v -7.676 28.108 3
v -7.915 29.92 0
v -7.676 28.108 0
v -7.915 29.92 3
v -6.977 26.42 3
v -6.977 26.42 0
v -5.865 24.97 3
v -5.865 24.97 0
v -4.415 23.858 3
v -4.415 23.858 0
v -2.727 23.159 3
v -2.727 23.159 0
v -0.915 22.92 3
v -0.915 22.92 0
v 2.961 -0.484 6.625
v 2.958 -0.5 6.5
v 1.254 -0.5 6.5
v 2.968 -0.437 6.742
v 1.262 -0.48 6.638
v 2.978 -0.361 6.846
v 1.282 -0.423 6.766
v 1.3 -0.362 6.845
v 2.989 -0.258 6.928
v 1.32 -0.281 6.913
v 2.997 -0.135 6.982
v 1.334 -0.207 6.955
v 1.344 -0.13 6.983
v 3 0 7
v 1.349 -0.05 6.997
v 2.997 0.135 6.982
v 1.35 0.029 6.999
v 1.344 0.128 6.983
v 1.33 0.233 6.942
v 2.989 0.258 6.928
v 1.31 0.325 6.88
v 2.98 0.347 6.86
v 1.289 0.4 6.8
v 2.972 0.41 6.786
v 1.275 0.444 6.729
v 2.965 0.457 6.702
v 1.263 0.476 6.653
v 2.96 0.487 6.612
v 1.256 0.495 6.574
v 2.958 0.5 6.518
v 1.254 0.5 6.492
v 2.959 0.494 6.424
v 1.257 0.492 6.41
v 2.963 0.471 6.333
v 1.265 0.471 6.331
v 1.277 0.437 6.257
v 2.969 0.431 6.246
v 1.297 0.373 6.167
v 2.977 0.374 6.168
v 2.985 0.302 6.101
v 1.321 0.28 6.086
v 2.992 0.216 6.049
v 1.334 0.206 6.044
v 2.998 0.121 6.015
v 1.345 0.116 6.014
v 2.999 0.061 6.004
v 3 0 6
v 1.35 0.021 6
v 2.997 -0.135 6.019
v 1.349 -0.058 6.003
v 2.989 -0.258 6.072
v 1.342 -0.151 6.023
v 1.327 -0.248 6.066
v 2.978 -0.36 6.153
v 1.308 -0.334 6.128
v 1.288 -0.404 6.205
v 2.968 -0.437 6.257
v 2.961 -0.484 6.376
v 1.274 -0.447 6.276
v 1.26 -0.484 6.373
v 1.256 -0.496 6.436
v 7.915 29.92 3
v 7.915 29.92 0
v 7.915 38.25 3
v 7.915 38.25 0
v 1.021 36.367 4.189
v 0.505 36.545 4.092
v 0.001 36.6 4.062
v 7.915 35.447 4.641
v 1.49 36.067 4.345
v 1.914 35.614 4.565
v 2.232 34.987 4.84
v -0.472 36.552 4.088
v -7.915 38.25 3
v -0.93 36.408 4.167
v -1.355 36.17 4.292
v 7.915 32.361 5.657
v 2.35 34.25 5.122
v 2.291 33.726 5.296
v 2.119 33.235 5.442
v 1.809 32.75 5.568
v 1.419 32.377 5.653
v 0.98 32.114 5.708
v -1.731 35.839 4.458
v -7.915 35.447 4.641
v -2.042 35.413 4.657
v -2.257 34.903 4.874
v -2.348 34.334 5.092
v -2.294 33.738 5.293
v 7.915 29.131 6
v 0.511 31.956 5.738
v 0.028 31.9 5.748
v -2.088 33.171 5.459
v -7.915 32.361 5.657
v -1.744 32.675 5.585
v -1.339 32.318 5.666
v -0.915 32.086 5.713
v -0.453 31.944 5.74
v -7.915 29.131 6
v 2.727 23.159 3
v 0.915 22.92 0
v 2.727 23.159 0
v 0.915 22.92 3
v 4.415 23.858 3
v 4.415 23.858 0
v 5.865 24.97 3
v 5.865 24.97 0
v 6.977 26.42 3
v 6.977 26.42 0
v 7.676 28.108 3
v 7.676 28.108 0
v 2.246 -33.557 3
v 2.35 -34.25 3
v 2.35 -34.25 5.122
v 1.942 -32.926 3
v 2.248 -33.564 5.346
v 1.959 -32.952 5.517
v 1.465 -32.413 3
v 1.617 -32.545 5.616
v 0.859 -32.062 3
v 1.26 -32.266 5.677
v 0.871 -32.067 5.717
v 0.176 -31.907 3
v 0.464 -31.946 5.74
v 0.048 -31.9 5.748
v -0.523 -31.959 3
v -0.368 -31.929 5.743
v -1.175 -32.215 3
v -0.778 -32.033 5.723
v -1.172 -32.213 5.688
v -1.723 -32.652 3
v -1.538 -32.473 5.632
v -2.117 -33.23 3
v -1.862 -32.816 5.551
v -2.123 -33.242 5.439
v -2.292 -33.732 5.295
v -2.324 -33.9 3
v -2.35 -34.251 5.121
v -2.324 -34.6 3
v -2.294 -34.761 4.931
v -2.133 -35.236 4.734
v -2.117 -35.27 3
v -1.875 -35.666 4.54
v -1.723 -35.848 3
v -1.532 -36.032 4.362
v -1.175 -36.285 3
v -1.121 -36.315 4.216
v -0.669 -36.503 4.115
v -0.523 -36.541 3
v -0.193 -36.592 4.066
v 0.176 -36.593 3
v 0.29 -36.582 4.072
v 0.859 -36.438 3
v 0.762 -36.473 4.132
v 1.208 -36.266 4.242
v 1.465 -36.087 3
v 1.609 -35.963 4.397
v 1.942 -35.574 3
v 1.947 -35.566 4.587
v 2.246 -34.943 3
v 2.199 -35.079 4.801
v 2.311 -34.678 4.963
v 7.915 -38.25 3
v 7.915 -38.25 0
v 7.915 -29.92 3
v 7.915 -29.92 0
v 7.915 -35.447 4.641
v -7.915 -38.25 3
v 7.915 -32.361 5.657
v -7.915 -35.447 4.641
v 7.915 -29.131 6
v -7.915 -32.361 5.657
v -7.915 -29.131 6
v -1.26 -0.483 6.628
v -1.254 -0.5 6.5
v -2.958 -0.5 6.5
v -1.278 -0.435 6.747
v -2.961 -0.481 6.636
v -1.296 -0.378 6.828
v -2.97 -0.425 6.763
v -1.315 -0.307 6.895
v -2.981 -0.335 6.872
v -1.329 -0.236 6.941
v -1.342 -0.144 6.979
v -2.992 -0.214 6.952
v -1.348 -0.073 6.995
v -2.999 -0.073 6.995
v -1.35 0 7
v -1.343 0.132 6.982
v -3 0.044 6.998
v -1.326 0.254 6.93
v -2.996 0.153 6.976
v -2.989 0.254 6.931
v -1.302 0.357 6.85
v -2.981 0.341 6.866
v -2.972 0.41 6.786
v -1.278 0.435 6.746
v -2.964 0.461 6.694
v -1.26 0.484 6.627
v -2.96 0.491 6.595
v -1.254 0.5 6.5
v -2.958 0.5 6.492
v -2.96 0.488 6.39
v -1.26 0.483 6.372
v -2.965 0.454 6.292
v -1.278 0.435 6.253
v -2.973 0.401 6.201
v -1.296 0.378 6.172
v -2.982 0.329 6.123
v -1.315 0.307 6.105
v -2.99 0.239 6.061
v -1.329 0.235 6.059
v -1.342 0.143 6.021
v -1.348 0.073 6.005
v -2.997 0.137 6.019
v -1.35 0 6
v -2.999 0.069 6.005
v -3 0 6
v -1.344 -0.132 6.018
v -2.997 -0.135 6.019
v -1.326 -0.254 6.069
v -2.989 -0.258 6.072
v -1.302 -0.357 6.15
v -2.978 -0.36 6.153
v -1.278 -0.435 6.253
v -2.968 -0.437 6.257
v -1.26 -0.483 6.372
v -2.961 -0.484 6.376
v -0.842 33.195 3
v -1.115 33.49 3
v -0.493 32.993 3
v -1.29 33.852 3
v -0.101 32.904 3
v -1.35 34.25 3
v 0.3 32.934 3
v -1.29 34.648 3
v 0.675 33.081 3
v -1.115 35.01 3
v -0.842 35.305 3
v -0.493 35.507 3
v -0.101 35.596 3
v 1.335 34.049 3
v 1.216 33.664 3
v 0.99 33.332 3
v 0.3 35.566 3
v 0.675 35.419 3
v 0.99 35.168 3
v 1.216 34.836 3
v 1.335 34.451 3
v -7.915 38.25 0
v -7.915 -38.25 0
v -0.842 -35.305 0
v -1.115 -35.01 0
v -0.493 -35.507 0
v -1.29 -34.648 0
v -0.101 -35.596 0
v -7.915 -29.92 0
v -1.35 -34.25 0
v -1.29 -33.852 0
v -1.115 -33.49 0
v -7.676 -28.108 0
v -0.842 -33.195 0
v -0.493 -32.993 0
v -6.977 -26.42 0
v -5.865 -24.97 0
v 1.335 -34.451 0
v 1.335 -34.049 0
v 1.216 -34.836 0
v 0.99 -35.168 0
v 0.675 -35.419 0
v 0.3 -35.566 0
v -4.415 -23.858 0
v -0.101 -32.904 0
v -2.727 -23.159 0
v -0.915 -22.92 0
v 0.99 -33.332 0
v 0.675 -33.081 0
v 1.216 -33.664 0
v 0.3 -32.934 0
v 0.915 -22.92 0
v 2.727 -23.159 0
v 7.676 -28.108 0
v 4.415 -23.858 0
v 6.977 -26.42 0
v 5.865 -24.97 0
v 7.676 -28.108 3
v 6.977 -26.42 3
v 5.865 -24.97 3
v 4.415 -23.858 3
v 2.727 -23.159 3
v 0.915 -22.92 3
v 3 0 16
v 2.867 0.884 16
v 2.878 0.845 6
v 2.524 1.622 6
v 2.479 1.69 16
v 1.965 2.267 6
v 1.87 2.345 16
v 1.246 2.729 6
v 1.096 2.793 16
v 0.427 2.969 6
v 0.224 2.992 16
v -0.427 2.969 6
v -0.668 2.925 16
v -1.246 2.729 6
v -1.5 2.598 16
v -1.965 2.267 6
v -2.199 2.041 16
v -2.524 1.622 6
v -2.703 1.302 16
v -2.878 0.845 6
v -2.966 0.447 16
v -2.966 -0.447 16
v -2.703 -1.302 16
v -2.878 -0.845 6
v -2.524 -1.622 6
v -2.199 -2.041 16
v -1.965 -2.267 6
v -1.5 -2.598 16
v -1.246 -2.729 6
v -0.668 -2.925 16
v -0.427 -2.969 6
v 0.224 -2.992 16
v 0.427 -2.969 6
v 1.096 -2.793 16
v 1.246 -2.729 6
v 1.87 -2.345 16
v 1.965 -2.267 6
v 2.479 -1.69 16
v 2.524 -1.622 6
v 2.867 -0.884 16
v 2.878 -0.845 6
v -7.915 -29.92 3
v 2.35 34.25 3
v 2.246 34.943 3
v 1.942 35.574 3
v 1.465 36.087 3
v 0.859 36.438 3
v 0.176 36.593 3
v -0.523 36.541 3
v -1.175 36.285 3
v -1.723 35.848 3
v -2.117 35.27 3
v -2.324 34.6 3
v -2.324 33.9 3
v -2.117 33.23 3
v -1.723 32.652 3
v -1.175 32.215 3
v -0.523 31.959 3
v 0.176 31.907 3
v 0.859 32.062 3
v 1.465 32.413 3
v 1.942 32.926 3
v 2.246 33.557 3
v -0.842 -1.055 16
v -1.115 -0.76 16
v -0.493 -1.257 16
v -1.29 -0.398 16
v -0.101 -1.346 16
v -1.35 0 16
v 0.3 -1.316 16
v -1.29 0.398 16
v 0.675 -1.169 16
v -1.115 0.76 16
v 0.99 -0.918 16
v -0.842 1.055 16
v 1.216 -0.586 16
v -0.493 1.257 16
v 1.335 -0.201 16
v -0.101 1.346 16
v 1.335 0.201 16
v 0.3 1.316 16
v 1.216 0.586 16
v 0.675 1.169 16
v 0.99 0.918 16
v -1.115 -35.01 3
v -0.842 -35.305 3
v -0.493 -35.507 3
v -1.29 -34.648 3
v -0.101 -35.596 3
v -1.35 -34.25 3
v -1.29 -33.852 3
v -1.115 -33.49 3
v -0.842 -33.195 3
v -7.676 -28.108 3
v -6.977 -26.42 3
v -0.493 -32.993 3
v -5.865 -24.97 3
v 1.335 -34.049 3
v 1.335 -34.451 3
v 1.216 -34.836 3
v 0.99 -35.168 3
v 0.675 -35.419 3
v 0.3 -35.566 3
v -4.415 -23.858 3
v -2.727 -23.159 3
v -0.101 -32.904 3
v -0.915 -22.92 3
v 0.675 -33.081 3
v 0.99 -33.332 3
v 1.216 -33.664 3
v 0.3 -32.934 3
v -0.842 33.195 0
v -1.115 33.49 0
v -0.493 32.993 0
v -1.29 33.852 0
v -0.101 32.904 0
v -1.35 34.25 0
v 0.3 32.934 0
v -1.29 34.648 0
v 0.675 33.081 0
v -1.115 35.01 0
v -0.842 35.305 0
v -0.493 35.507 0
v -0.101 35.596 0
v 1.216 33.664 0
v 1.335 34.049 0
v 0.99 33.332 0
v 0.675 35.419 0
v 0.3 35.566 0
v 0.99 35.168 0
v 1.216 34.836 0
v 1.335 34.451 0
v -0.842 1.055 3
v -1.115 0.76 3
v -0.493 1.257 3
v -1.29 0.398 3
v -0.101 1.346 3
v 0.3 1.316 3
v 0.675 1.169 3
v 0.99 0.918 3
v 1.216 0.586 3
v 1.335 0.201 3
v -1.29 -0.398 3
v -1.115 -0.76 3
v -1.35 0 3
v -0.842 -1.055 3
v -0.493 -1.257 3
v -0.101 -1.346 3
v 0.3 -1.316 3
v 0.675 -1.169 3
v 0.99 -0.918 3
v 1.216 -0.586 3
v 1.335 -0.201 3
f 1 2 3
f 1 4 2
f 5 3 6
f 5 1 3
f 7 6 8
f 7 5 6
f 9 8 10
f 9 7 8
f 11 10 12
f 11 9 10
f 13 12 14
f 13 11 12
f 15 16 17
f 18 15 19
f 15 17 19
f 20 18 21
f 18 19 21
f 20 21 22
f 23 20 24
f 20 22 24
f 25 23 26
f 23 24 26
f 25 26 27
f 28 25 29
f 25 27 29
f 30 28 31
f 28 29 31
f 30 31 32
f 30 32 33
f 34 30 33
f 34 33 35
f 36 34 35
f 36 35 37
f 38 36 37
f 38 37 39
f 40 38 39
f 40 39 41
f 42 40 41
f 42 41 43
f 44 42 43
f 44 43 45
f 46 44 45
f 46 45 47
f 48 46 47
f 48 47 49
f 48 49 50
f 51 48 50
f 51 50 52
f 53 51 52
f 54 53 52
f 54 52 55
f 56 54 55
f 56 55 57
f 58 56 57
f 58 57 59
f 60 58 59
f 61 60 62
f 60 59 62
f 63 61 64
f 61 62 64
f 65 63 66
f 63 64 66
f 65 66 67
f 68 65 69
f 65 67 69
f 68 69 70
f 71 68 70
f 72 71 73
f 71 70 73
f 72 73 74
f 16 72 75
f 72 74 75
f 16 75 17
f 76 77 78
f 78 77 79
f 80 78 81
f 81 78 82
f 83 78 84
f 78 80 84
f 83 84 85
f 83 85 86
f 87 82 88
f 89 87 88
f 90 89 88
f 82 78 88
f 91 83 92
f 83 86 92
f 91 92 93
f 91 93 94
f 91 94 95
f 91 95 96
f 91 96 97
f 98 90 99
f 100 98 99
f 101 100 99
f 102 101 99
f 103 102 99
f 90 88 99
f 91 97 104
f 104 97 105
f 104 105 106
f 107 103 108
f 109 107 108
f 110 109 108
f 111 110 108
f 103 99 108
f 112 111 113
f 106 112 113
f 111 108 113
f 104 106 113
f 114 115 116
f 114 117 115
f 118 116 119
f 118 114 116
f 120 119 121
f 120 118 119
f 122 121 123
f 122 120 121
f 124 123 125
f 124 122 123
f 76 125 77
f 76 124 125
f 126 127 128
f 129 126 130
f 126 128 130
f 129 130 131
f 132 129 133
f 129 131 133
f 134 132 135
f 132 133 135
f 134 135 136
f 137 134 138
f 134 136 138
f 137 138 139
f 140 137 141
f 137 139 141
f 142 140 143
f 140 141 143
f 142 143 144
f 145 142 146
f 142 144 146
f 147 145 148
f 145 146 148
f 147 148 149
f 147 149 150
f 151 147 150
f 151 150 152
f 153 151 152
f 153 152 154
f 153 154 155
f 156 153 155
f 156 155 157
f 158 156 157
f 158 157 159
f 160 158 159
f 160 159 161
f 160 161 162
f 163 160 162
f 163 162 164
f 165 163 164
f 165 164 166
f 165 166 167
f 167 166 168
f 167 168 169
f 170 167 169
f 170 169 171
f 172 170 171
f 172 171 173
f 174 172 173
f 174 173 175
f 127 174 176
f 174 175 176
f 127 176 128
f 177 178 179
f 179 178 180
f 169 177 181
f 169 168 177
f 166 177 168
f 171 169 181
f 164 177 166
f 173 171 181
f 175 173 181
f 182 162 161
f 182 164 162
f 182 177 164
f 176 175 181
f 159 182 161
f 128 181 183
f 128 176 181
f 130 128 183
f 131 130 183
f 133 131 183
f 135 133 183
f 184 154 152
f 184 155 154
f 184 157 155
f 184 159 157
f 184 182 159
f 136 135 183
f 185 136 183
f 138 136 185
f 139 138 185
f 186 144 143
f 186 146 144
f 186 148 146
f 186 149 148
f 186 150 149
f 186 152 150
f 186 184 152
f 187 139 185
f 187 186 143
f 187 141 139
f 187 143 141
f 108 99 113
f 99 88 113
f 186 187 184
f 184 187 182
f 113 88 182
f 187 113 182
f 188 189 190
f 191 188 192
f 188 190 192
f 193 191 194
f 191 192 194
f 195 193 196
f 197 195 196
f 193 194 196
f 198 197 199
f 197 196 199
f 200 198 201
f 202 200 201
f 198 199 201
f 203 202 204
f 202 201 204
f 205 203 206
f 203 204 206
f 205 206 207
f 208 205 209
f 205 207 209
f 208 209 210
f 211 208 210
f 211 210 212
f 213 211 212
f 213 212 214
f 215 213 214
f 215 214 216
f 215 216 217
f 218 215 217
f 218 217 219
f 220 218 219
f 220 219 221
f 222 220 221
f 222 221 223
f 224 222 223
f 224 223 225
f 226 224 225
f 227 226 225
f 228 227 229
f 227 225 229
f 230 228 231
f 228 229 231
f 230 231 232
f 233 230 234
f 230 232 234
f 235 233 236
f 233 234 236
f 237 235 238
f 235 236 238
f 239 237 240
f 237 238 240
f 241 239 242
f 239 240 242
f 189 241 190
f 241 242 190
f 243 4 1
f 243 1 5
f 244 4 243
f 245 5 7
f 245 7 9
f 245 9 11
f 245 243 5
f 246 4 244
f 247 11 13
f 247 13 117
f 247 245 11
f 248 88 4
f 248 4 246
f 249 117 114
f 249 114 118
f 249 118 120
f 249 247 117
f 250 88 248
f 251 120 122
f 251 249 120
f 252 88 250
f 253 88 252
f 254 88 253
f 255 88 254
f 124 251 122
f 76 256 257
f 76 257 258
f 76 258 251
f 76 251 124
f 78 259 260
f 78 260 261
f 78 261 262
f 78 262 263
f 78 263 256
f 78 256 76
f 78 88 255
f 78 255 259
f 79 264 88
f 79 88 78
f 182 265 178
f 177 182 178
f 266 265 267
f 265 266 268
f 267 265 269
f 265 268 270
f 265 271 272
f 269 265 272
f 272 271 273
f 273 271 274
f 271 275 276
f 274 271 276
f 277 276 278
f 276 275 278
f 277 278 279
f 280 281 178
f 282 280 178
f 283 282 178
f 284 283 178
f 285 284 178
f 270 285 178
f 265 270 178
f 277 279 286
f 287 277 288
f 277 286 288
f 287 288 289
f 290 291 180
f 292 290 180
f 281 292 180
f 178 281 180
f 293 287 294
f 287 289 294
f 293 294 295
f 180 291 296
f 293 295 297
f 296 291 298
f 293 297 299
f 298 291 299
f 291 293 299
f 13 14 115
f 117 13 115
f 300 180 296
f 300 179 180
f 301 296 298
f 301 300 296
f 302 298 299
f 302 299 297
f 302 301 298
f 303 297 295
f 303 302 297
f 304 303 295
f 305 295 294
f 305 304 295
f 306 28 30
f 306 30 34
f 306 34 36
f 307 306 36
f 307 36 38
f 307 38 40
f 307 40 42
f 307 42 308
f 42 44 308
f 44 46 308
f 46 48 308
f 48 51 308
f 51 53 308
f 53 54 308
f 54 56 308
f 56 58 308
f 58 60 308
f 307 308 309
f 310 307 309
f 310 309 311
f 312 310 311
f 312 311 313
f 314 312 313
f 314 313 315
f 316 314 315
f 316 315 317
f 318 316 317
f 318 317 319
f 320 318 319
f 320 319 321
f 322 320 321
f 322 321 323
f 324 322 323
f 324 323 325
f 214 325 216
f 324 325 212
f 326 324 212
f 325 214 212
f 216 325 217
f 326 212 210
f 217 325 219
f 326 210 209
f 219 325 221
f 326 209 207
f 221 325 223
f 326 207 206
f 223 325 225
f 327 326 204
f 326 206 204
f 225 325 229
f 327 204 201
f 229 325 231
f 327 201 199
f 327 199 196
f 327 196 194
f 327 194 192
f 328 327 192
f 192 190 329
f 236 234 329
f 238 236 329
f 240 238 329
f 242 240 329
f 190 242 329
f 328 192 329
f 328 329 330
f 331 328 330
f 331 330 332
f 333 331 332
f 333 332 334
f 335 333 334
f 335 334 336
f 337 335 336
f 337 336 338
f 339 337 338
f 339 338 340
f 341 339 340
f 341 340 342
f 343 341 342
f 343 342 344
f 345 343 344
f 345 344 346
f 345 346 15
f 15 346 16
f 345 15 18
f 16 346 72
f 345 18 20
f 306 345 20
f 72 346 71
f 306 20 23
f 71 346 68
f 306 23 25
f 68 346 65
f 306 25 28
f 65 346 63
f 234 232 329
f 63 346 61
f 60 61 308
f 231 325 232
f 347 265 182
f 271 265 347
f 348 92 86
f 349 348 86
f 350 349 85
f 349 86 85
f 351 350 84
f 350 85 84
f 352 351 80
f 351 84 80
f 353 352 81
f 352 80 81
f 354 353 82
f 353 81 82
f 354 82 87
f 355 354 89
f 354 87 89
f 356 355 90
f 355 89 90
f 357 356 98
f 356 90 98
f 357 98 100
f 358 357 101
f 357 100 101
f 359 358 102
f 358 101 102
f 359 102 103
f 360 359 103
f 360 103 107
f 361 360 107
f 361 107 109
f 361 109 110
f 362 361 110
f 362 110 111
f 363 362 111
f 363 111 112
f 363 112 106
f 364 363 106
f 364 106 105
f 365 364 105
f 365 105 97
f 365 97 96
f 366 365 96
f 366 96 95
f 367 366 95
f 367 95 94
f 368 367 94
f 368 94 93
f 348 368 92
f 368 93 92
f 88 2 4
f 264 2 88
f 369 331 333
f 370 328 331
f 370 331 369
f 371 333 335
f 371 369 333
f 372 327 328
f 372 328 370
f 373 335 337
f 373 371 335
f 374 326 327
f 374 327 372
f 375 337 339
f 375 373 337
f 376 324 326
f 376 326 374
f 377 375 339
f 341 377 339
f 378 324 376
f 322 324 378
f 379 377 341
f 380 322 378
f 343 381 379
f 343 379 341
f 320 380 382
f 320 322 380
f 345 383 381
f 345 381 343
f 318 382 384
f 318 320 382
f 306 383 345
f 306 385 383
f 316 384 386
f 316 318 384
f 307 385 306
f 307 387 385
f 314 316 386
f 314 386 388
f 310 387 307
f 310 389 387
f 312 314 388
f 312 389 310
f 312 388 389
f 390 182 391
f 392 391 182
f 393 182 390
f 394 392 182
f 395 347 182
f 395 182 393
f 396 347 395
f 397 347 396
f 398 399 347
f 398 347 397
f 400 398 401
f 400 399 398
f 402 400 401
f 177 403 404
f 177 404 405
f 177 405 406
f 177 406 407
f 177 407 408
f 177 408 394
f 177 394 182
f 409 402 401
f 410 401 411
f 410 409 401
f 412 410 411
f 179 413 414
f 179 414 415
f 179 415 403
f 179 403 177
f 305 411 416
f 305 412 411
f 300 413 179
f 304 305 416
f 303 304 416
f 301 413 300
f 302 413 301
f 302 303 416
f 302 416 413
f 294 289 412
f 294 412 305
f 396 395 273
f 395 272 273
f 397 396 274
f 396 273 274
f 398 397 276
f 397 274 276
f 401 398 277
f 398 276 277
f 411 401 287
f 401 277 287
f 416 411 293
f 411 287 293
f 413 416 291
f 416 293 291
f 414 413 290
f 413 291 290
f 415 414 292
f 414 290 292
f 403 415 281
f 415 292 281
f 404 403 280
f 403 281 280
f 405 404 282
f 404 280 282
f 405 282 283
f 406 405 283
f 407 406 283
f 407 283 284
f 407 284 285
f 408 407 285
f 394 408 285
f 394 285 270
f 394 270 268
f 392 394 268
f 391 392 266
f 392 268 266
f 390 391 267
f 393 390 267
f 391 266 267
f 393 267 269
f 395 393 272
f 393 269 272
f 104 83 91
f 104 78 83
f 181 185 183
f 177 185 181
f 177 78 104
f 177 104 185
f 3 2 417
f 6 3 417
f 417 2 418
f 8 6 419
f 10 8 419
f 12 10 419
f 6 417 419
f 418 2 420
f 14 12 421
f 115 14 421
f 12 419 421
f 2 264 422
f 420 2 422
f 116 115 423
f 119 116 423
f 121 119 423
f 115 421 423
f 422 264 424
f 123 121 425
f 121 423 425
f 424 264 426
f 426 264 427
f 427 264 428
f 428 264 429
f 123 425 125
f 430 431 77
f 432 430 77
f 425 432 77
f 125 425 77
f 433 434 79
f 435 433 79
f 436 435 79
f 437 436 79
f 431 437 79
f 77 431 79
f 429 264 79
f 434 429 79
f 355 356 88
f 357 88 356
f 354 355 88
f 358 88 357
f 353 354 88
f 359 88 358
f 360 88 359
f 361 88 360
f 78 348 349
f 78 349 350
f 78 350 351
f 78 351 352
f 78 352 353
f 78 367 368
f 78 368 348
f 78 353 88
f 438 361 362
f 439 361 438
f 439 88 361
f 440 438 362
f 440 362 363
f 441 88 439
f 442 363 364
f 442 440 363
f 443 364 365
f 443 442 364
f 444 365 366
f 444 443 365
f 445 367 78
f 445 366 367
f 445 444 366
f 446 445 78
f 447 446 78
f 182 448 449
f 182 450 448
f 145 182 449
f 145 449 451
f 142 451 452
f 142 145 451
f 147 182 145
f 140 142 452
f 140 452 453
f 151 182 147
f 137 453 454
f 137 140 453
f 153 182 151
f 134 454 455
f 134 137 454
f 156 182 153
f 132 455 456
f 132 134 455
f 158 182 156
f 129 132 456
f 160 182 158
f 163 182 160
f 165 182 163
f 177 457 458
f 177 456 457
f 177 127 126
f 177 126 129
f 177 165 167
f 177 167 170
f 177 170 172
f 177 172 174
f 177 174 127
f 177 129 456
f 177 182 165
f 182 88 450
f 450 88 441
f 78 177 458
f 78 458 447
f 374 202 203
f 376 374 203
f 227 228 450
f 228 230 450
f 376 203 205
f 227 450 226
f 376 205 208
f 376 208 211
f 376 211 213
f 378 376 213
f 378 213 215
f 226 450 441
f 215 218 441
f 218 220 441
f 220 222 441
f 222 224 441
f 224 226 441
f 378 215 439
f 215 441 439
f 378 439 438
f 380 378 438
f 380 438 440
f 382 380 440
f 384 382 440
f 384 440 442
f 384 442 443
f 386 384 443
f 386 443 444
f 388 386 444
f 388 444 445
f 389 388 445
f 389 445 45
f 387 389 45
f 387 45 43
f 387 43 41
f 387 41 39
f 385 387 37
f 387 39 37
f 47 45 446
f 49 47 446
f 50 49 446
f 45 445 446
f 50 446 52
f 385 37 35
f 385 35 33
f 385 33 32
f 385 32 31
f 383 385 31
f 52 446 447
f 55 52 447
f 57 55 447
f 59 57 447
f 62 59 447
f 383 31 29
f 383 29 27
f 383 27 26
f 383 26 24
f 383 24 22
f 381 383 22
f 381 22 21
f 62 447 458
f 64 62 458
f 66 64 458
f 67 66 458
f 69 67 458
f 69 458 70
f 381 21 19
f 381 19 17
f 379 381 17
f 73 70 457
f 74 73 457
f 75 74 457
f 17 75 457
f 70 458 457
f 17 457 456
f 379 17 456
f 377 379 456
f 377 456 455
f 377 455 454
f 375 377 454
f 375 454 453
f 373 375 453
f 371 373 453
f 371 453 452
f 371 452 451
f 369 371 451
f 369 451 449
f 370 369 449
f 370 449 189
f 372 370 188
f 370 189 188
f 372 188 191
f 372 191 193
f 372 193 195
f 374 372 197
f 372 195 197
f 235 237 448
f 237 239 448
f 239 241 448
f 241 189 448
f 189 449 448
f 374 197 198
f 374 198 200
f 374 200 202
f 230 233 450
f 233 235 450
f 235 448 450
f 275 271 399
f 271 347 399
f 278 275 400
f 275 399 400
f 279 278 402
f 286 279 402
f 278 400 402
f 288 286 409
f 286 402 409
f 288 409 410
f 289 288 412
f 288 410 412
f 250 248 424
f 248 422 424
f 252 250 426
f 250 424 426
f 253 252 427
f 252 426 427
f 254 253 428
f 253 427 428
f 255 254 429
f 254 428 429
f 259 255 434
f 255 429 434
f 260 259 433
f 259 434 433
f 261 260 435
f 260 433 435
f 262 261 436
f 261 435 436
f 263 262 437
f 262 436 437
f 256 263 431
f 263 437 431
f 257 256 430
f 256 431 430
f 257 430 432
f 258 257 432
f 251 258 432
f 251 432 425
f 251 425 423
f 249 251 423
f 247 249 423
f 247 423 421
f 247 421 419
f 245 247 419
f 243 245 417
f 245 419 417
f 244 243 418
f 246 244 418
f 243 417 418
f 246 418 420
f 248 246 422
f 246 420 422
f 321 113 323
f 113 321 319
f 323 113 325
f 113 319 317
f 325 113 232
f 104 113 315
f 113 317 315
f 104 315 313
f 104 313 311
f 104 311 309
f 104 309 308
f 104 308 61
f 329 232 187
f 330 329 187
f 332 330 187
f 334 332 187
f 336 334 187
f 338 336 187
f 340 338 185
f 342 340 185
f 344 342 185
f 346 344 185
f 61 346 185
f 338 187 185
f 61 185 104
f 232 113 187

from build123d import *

# Parameters (mm, degrees)
F0_W              = 15.83
F0_H              = 15.33
F1_DEPTH          = 3
F2_R              = 7
F2_2_R            = 7
F5_W              = 15.83
F5_H              = 76.5
F6_DEPTH          = 3
F7_T1_DEPTH       = 61.4260524607
F11_D             = 2.7
F11_DEPTH         = 10
F11_CBORE_D       = 4.7
F11_CBORE_DEPTH   = 3
F11_TIP           = 0.8111618357
F11_2_D           = 2.7
F11_2_DEPTH       = 10
F11_2_CBORE_D     = 4.7
F11_2_CBORE_DEPTH = 3
F11_2_TIP         = 0.8111618357
F11_3_D           = 2.7
F11_3_DEPTH       = 10
F11_3_CBORE_D     = 4.7
F11_3_CBORE_DEPTH = 3
F11_3_TIP         = 0.8111618357
F12_R             = 3
F13_DEPTH         = 10
F15_D             = 2.7
F15_DEPTH         = 20
F15_TIP           = 0.8111618357
F17_D             = 1


# Not quite as in the source:
# - a fillet or chamfer that OpenCascade refuses, or shapes differently, is made with other operations: its cross-section is extruded or revolved along the edge and cut away or added


with BuildPart() as f1:
    # F0 (on Top) → F1 (new body)
    with BuildSketch(Plane.XY):
        with Locations((0, 30.585)):
            Rectangle(F0_W, F0_H)
    extrude(amount=F1_DEPTH)

    # F2
    f2_edges = [f1.edges().sort_by_distance(p)[0] for p in [
        (-7.915, 22.92, 1.5),
        (7.915, 22.92, 1.5),
    ]]
    fillet(f2_edges, radius=F2_R)

    # F11
    with Locations(Plane.XY.offset(6)):
        with Locations((0, 34.25), (0, -34.25)):
            CounterBoreHole(F11_D / 2, F11_CBORE_D / 2, F11_CBORE_DEPTH, depth=F11_DEPTH)
            with Locations((0, 0, -(F11_DEPTH + F11_TIP / 2))):  # 118° drill point
                Cone(0, F11_D / 2, F11_TIP, mode=Mode.SUBTRACT)


with BuildPart() as f1b:
    # F0 (on Top) → F1, piece 2 (new body)
    with BuildSketch(Plane.XY):
        with Locations((0, -30.585)):
            Rectangle(F0_W, F0_H)
    extrude(amount=F1_DEPTH)

    # F2#2
    f2_2_edges = [f1b.edges().sort_by_distance(p)[0] for p in [
        (-7.915, -22.92, 1.5),
        (7.915, -22.92, 1.5),
    ]]
    fillet(f2_2_edges, radius=F2_2_R)

    # F11#2
    with Locations(Plane.XY.offset(6)):
        with Locations((0, 34.25), (0, -34.25)):
            CounterBoreHole(F11_2_D / 2, F11_2_CBORE_D / 2, F11_2_CBORE_DEPTH, depth=F11_2_DEPTH)
            with Locations((0, 0, -(F11_2_DEPTH + F11_2_TIP / 2))):  # 118° drill point
                Cone(0, F11_2_D / 2, F11_2_TIP, mode=Mode.SUBTRACT)


with BuildPart() as f6:
    # F5 (on face) → F6 (new body)
    with BuildSketch(Plane(origin=(0, 0, 3), x_dir=(1, 0, 0), z_dir=(0, 0, -1))):
        Rectangle(F5_W, F5_H)
    extrude(amount=-F6_DEPTH)

    # F7: fillet of radius 15.36 on 2 edges, made by hand

    # F7_s2 → F7_t1 (cut)
    with BuildSketch(Plane.YZ.offset(-30.7130262304)):
        with BuildLine():
            ThreePointArc((38.25, 3), (33.9307895079, 5.2307367874), (29.1307895079, 6))
            Line((29.1307895079, 6), (38.25, 6))
            Line((38.25, 6), (38.25, 3))
        make_face()
        with BuildLine():
            ThreePointArc((-38.25, 3), (-33.9307895079, 5.2307367874), (-29.1307895079, 6))
            Line((-29.1307895079, 6), (-38.25, 6))
            Line((-38.25, 6), (-38.25, 3))
        make_face()
    extrude(amount=F7_T1_DEPTH, mode=Mode.SUBTRACT)

    # F11#3
    with Locations(Plane.XY.offset(6)):
        with Locations((0, 34.25), (0, -34.25)):
            CounterBoreHole(F11_3_D / 2, F11_3_CBORE_D / 2, F11_3_CBORE_DEPTH, depth=F11_3_DEPTH)
            with Locations((0, 0, -(F11_3_DEPTH + F11_3_TIP / 2))):  # 118° drill point
                Cone(0, F11_3_D / 2, F11_3_TIP, mode=Mode.SUBTRACT)

    # F12 (on face) → F13 (join)
    with BuildSketch(Plane.XY.offset(6)):
        Circle(F12_R)
    extrude(amount=F13_DEPTH)

    # F15
    with Locations(Plane.XY.offset(16)):
        with Locations((0, 0)):
            Hole(F15_D / 2, depth=F15_DEPTH)
            with Locations((0, 0, -(F15_DEPTH + F15_TIP / 2))):  # 118° drill point
                Cone(0, F15_D / 2, F15_TIP, mode=Mode.SUBTRACT)

    # F17 (through all)
    with Locations(Plane.YZ.offset(7.915)):
        with Locations((0, 6.5)):
            Hole(F17_D / 2)


solid = Compound([f1.part, f1b.part, f6.part])
